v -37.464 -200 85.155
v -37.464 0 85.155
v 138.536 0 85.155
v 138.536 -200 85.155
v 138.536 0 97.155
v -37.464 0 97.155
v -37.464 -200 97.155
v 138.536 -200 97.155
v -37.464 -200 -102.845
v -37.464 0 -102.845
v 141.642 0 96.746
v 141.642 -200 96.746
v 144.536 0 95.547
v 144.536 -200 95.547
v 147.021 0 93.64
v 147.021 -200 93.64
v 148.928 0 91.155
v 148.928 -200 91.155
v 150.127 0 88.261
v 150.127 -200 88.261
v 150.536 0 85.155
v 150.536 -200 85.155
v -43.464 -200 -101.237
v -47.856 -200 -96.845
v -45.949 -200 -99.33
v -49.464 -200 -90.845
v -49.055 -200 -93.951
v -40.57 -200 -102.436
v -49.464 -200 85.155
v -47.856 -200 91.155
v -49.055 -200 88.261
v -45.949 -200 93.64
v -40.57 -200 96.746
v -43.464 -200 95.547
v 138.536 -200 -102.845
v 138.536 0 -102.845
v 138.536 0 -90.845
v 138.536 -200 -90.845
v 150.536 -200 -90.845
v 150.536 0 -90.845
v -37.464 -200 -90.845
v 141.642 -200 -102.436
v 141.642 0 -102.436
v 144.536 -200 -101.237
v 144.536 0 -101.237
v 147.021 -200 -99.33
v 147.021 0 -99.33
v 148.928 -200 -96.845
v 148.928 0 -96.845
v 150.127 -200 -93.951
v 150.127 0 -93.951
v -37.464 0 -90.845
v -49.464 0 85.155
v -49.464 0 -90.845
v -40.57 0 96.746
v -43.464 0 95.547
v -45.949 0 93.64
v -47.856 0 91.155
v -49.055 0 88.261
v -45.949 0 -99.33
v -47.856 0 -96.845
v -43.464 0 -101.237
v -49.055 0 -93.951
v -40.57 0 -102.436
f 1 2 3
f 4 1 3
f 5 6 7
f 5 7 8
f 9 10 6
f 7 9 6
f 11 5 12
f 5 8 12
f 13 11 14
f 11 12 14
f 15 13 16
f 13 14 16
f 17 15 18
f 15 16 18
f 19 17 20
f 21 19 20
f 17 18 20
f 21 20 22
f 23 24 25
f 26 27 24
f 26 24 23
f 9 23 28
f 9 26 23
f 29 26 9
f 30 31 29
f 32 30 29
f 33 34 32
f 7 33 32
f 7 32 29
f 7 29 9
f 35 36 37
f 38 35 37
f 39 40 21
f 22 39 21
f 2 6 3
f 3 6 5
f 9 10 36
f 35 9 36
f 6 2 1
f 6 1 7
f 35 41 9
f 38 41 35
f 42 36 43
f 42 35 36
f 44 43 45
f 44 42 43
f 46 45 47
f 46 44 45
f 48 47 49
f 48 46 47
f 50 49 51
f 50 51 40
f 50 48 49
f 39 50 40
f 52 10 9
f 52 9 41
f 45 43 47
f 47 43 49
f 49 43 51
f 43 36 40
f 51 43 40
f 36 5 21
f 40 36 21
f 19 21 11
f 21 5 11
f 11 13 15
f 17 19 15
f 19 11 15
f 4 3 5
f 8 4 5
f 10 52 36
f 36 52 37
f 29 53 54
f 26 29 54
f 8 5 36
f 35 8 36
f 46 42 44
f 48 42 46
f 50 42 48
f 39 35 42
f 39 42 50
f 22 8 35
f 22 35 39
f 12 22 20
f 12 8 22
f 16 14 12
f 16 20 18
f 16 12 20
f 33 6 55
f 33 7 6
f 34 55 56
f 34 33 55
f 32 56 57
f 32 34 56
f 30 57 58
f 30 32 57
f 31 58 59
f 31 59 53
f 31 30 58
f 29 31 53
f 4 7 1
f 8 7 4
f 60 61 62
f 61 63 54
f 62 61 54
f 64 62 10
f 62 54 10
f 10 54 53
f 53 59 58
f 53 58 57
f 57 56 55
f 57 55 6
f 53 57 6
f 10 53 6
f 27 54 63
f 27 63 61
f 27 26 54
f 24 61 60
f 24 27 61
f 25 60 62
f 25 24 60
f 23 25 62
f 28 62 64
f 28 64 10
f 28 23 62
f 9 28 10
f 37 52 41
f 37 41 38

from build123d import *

# Parameters (mm, degrees)
F2_DEPTH = 200
F1_W     = 176
F1_H     = 12
F3_DEPTH = 200
F4_R     = 11.99999
F4_2_R   = 11.99999


# Not quite as in the source:
# - a fillet or chamfer is up to 0.001 mm smaller than in the source, because OpenCascade refuses the exact size


with BuildPart() as f2:
    # F1 (on Front) → F2 (new body)
    with BuildSketch(Plane.XZ):
        Polygon((-37.4641348869, 97.1549547033), (-49.4641348869, 97.1549547033), (-49.4641348869, -102.8450452967), (-37.4641348869, -102.8450452967), (-37.4641348869, -90.8450452967), (-37.4641348869, 85.1549547033), align=None)
    extrude(amount=F2_DEPTH)

    # F4#2 (radius 12 in the source; OpenCascade refuses exactly that, so slightly less here)
    f4_2_edges = [f2.edges().sort_by_distance(p)[0] for p in [
        (-49.464135, -100, -102.845045),
        (-49.464135, -100, 97.154955),
    ]]
    fillet(f4_2_edges, radius=F4_2_R)


with BuildPart() as f2b:
    # F1 (on Front) → F2, piece 2 (new body)
    with BuildSketch(Plane.XZ):
        Polygon((150.5358651131, 97.1549547033), (138.5358651131, 97.1549547033), (138.5358651131, 85.1549547033), (138.5358651131, -90.8450452967), (138.5358651131, -102.8450452967), (150.5358651131, -102.8450452967), align=None)
    extrude(amount=F2_DEPTH)

    # F4 (radius 12 in the source; OpenCascade refuses exactly that, so slightly less here)
    f4_edges = [f2b.edges().sort_by_distance(p)[0] for p in [
        (150.535865, -100, -102.845045),
        (150.535865, -100, 97.154955),
    ]]
    fillet(f4_edges, radius=F4_R)


with BuildPart() as f3:
    # F1 (on Front) → F3 (new body)
    with BuildSketch(Plane.XZ):
        with Locations((50.5358651131, 91.1549547033)):
            Rectangle(F1_W, F1_H)
    extrude(amount=F3_DEPTH)


with BuildPart() as f3b:
    # F1 (on Front) → F3, piece 2 (new body)
    with BuildSketch(Plane.XZ):
        with Locations((50.5358651131, -96.8450452967)):
            Rectangle(F1_W, F1_H)
    extrude(amount=F3_DEPTH)


solid = Compound([f2.part, f2b.part, f3.part, f3b.part])
